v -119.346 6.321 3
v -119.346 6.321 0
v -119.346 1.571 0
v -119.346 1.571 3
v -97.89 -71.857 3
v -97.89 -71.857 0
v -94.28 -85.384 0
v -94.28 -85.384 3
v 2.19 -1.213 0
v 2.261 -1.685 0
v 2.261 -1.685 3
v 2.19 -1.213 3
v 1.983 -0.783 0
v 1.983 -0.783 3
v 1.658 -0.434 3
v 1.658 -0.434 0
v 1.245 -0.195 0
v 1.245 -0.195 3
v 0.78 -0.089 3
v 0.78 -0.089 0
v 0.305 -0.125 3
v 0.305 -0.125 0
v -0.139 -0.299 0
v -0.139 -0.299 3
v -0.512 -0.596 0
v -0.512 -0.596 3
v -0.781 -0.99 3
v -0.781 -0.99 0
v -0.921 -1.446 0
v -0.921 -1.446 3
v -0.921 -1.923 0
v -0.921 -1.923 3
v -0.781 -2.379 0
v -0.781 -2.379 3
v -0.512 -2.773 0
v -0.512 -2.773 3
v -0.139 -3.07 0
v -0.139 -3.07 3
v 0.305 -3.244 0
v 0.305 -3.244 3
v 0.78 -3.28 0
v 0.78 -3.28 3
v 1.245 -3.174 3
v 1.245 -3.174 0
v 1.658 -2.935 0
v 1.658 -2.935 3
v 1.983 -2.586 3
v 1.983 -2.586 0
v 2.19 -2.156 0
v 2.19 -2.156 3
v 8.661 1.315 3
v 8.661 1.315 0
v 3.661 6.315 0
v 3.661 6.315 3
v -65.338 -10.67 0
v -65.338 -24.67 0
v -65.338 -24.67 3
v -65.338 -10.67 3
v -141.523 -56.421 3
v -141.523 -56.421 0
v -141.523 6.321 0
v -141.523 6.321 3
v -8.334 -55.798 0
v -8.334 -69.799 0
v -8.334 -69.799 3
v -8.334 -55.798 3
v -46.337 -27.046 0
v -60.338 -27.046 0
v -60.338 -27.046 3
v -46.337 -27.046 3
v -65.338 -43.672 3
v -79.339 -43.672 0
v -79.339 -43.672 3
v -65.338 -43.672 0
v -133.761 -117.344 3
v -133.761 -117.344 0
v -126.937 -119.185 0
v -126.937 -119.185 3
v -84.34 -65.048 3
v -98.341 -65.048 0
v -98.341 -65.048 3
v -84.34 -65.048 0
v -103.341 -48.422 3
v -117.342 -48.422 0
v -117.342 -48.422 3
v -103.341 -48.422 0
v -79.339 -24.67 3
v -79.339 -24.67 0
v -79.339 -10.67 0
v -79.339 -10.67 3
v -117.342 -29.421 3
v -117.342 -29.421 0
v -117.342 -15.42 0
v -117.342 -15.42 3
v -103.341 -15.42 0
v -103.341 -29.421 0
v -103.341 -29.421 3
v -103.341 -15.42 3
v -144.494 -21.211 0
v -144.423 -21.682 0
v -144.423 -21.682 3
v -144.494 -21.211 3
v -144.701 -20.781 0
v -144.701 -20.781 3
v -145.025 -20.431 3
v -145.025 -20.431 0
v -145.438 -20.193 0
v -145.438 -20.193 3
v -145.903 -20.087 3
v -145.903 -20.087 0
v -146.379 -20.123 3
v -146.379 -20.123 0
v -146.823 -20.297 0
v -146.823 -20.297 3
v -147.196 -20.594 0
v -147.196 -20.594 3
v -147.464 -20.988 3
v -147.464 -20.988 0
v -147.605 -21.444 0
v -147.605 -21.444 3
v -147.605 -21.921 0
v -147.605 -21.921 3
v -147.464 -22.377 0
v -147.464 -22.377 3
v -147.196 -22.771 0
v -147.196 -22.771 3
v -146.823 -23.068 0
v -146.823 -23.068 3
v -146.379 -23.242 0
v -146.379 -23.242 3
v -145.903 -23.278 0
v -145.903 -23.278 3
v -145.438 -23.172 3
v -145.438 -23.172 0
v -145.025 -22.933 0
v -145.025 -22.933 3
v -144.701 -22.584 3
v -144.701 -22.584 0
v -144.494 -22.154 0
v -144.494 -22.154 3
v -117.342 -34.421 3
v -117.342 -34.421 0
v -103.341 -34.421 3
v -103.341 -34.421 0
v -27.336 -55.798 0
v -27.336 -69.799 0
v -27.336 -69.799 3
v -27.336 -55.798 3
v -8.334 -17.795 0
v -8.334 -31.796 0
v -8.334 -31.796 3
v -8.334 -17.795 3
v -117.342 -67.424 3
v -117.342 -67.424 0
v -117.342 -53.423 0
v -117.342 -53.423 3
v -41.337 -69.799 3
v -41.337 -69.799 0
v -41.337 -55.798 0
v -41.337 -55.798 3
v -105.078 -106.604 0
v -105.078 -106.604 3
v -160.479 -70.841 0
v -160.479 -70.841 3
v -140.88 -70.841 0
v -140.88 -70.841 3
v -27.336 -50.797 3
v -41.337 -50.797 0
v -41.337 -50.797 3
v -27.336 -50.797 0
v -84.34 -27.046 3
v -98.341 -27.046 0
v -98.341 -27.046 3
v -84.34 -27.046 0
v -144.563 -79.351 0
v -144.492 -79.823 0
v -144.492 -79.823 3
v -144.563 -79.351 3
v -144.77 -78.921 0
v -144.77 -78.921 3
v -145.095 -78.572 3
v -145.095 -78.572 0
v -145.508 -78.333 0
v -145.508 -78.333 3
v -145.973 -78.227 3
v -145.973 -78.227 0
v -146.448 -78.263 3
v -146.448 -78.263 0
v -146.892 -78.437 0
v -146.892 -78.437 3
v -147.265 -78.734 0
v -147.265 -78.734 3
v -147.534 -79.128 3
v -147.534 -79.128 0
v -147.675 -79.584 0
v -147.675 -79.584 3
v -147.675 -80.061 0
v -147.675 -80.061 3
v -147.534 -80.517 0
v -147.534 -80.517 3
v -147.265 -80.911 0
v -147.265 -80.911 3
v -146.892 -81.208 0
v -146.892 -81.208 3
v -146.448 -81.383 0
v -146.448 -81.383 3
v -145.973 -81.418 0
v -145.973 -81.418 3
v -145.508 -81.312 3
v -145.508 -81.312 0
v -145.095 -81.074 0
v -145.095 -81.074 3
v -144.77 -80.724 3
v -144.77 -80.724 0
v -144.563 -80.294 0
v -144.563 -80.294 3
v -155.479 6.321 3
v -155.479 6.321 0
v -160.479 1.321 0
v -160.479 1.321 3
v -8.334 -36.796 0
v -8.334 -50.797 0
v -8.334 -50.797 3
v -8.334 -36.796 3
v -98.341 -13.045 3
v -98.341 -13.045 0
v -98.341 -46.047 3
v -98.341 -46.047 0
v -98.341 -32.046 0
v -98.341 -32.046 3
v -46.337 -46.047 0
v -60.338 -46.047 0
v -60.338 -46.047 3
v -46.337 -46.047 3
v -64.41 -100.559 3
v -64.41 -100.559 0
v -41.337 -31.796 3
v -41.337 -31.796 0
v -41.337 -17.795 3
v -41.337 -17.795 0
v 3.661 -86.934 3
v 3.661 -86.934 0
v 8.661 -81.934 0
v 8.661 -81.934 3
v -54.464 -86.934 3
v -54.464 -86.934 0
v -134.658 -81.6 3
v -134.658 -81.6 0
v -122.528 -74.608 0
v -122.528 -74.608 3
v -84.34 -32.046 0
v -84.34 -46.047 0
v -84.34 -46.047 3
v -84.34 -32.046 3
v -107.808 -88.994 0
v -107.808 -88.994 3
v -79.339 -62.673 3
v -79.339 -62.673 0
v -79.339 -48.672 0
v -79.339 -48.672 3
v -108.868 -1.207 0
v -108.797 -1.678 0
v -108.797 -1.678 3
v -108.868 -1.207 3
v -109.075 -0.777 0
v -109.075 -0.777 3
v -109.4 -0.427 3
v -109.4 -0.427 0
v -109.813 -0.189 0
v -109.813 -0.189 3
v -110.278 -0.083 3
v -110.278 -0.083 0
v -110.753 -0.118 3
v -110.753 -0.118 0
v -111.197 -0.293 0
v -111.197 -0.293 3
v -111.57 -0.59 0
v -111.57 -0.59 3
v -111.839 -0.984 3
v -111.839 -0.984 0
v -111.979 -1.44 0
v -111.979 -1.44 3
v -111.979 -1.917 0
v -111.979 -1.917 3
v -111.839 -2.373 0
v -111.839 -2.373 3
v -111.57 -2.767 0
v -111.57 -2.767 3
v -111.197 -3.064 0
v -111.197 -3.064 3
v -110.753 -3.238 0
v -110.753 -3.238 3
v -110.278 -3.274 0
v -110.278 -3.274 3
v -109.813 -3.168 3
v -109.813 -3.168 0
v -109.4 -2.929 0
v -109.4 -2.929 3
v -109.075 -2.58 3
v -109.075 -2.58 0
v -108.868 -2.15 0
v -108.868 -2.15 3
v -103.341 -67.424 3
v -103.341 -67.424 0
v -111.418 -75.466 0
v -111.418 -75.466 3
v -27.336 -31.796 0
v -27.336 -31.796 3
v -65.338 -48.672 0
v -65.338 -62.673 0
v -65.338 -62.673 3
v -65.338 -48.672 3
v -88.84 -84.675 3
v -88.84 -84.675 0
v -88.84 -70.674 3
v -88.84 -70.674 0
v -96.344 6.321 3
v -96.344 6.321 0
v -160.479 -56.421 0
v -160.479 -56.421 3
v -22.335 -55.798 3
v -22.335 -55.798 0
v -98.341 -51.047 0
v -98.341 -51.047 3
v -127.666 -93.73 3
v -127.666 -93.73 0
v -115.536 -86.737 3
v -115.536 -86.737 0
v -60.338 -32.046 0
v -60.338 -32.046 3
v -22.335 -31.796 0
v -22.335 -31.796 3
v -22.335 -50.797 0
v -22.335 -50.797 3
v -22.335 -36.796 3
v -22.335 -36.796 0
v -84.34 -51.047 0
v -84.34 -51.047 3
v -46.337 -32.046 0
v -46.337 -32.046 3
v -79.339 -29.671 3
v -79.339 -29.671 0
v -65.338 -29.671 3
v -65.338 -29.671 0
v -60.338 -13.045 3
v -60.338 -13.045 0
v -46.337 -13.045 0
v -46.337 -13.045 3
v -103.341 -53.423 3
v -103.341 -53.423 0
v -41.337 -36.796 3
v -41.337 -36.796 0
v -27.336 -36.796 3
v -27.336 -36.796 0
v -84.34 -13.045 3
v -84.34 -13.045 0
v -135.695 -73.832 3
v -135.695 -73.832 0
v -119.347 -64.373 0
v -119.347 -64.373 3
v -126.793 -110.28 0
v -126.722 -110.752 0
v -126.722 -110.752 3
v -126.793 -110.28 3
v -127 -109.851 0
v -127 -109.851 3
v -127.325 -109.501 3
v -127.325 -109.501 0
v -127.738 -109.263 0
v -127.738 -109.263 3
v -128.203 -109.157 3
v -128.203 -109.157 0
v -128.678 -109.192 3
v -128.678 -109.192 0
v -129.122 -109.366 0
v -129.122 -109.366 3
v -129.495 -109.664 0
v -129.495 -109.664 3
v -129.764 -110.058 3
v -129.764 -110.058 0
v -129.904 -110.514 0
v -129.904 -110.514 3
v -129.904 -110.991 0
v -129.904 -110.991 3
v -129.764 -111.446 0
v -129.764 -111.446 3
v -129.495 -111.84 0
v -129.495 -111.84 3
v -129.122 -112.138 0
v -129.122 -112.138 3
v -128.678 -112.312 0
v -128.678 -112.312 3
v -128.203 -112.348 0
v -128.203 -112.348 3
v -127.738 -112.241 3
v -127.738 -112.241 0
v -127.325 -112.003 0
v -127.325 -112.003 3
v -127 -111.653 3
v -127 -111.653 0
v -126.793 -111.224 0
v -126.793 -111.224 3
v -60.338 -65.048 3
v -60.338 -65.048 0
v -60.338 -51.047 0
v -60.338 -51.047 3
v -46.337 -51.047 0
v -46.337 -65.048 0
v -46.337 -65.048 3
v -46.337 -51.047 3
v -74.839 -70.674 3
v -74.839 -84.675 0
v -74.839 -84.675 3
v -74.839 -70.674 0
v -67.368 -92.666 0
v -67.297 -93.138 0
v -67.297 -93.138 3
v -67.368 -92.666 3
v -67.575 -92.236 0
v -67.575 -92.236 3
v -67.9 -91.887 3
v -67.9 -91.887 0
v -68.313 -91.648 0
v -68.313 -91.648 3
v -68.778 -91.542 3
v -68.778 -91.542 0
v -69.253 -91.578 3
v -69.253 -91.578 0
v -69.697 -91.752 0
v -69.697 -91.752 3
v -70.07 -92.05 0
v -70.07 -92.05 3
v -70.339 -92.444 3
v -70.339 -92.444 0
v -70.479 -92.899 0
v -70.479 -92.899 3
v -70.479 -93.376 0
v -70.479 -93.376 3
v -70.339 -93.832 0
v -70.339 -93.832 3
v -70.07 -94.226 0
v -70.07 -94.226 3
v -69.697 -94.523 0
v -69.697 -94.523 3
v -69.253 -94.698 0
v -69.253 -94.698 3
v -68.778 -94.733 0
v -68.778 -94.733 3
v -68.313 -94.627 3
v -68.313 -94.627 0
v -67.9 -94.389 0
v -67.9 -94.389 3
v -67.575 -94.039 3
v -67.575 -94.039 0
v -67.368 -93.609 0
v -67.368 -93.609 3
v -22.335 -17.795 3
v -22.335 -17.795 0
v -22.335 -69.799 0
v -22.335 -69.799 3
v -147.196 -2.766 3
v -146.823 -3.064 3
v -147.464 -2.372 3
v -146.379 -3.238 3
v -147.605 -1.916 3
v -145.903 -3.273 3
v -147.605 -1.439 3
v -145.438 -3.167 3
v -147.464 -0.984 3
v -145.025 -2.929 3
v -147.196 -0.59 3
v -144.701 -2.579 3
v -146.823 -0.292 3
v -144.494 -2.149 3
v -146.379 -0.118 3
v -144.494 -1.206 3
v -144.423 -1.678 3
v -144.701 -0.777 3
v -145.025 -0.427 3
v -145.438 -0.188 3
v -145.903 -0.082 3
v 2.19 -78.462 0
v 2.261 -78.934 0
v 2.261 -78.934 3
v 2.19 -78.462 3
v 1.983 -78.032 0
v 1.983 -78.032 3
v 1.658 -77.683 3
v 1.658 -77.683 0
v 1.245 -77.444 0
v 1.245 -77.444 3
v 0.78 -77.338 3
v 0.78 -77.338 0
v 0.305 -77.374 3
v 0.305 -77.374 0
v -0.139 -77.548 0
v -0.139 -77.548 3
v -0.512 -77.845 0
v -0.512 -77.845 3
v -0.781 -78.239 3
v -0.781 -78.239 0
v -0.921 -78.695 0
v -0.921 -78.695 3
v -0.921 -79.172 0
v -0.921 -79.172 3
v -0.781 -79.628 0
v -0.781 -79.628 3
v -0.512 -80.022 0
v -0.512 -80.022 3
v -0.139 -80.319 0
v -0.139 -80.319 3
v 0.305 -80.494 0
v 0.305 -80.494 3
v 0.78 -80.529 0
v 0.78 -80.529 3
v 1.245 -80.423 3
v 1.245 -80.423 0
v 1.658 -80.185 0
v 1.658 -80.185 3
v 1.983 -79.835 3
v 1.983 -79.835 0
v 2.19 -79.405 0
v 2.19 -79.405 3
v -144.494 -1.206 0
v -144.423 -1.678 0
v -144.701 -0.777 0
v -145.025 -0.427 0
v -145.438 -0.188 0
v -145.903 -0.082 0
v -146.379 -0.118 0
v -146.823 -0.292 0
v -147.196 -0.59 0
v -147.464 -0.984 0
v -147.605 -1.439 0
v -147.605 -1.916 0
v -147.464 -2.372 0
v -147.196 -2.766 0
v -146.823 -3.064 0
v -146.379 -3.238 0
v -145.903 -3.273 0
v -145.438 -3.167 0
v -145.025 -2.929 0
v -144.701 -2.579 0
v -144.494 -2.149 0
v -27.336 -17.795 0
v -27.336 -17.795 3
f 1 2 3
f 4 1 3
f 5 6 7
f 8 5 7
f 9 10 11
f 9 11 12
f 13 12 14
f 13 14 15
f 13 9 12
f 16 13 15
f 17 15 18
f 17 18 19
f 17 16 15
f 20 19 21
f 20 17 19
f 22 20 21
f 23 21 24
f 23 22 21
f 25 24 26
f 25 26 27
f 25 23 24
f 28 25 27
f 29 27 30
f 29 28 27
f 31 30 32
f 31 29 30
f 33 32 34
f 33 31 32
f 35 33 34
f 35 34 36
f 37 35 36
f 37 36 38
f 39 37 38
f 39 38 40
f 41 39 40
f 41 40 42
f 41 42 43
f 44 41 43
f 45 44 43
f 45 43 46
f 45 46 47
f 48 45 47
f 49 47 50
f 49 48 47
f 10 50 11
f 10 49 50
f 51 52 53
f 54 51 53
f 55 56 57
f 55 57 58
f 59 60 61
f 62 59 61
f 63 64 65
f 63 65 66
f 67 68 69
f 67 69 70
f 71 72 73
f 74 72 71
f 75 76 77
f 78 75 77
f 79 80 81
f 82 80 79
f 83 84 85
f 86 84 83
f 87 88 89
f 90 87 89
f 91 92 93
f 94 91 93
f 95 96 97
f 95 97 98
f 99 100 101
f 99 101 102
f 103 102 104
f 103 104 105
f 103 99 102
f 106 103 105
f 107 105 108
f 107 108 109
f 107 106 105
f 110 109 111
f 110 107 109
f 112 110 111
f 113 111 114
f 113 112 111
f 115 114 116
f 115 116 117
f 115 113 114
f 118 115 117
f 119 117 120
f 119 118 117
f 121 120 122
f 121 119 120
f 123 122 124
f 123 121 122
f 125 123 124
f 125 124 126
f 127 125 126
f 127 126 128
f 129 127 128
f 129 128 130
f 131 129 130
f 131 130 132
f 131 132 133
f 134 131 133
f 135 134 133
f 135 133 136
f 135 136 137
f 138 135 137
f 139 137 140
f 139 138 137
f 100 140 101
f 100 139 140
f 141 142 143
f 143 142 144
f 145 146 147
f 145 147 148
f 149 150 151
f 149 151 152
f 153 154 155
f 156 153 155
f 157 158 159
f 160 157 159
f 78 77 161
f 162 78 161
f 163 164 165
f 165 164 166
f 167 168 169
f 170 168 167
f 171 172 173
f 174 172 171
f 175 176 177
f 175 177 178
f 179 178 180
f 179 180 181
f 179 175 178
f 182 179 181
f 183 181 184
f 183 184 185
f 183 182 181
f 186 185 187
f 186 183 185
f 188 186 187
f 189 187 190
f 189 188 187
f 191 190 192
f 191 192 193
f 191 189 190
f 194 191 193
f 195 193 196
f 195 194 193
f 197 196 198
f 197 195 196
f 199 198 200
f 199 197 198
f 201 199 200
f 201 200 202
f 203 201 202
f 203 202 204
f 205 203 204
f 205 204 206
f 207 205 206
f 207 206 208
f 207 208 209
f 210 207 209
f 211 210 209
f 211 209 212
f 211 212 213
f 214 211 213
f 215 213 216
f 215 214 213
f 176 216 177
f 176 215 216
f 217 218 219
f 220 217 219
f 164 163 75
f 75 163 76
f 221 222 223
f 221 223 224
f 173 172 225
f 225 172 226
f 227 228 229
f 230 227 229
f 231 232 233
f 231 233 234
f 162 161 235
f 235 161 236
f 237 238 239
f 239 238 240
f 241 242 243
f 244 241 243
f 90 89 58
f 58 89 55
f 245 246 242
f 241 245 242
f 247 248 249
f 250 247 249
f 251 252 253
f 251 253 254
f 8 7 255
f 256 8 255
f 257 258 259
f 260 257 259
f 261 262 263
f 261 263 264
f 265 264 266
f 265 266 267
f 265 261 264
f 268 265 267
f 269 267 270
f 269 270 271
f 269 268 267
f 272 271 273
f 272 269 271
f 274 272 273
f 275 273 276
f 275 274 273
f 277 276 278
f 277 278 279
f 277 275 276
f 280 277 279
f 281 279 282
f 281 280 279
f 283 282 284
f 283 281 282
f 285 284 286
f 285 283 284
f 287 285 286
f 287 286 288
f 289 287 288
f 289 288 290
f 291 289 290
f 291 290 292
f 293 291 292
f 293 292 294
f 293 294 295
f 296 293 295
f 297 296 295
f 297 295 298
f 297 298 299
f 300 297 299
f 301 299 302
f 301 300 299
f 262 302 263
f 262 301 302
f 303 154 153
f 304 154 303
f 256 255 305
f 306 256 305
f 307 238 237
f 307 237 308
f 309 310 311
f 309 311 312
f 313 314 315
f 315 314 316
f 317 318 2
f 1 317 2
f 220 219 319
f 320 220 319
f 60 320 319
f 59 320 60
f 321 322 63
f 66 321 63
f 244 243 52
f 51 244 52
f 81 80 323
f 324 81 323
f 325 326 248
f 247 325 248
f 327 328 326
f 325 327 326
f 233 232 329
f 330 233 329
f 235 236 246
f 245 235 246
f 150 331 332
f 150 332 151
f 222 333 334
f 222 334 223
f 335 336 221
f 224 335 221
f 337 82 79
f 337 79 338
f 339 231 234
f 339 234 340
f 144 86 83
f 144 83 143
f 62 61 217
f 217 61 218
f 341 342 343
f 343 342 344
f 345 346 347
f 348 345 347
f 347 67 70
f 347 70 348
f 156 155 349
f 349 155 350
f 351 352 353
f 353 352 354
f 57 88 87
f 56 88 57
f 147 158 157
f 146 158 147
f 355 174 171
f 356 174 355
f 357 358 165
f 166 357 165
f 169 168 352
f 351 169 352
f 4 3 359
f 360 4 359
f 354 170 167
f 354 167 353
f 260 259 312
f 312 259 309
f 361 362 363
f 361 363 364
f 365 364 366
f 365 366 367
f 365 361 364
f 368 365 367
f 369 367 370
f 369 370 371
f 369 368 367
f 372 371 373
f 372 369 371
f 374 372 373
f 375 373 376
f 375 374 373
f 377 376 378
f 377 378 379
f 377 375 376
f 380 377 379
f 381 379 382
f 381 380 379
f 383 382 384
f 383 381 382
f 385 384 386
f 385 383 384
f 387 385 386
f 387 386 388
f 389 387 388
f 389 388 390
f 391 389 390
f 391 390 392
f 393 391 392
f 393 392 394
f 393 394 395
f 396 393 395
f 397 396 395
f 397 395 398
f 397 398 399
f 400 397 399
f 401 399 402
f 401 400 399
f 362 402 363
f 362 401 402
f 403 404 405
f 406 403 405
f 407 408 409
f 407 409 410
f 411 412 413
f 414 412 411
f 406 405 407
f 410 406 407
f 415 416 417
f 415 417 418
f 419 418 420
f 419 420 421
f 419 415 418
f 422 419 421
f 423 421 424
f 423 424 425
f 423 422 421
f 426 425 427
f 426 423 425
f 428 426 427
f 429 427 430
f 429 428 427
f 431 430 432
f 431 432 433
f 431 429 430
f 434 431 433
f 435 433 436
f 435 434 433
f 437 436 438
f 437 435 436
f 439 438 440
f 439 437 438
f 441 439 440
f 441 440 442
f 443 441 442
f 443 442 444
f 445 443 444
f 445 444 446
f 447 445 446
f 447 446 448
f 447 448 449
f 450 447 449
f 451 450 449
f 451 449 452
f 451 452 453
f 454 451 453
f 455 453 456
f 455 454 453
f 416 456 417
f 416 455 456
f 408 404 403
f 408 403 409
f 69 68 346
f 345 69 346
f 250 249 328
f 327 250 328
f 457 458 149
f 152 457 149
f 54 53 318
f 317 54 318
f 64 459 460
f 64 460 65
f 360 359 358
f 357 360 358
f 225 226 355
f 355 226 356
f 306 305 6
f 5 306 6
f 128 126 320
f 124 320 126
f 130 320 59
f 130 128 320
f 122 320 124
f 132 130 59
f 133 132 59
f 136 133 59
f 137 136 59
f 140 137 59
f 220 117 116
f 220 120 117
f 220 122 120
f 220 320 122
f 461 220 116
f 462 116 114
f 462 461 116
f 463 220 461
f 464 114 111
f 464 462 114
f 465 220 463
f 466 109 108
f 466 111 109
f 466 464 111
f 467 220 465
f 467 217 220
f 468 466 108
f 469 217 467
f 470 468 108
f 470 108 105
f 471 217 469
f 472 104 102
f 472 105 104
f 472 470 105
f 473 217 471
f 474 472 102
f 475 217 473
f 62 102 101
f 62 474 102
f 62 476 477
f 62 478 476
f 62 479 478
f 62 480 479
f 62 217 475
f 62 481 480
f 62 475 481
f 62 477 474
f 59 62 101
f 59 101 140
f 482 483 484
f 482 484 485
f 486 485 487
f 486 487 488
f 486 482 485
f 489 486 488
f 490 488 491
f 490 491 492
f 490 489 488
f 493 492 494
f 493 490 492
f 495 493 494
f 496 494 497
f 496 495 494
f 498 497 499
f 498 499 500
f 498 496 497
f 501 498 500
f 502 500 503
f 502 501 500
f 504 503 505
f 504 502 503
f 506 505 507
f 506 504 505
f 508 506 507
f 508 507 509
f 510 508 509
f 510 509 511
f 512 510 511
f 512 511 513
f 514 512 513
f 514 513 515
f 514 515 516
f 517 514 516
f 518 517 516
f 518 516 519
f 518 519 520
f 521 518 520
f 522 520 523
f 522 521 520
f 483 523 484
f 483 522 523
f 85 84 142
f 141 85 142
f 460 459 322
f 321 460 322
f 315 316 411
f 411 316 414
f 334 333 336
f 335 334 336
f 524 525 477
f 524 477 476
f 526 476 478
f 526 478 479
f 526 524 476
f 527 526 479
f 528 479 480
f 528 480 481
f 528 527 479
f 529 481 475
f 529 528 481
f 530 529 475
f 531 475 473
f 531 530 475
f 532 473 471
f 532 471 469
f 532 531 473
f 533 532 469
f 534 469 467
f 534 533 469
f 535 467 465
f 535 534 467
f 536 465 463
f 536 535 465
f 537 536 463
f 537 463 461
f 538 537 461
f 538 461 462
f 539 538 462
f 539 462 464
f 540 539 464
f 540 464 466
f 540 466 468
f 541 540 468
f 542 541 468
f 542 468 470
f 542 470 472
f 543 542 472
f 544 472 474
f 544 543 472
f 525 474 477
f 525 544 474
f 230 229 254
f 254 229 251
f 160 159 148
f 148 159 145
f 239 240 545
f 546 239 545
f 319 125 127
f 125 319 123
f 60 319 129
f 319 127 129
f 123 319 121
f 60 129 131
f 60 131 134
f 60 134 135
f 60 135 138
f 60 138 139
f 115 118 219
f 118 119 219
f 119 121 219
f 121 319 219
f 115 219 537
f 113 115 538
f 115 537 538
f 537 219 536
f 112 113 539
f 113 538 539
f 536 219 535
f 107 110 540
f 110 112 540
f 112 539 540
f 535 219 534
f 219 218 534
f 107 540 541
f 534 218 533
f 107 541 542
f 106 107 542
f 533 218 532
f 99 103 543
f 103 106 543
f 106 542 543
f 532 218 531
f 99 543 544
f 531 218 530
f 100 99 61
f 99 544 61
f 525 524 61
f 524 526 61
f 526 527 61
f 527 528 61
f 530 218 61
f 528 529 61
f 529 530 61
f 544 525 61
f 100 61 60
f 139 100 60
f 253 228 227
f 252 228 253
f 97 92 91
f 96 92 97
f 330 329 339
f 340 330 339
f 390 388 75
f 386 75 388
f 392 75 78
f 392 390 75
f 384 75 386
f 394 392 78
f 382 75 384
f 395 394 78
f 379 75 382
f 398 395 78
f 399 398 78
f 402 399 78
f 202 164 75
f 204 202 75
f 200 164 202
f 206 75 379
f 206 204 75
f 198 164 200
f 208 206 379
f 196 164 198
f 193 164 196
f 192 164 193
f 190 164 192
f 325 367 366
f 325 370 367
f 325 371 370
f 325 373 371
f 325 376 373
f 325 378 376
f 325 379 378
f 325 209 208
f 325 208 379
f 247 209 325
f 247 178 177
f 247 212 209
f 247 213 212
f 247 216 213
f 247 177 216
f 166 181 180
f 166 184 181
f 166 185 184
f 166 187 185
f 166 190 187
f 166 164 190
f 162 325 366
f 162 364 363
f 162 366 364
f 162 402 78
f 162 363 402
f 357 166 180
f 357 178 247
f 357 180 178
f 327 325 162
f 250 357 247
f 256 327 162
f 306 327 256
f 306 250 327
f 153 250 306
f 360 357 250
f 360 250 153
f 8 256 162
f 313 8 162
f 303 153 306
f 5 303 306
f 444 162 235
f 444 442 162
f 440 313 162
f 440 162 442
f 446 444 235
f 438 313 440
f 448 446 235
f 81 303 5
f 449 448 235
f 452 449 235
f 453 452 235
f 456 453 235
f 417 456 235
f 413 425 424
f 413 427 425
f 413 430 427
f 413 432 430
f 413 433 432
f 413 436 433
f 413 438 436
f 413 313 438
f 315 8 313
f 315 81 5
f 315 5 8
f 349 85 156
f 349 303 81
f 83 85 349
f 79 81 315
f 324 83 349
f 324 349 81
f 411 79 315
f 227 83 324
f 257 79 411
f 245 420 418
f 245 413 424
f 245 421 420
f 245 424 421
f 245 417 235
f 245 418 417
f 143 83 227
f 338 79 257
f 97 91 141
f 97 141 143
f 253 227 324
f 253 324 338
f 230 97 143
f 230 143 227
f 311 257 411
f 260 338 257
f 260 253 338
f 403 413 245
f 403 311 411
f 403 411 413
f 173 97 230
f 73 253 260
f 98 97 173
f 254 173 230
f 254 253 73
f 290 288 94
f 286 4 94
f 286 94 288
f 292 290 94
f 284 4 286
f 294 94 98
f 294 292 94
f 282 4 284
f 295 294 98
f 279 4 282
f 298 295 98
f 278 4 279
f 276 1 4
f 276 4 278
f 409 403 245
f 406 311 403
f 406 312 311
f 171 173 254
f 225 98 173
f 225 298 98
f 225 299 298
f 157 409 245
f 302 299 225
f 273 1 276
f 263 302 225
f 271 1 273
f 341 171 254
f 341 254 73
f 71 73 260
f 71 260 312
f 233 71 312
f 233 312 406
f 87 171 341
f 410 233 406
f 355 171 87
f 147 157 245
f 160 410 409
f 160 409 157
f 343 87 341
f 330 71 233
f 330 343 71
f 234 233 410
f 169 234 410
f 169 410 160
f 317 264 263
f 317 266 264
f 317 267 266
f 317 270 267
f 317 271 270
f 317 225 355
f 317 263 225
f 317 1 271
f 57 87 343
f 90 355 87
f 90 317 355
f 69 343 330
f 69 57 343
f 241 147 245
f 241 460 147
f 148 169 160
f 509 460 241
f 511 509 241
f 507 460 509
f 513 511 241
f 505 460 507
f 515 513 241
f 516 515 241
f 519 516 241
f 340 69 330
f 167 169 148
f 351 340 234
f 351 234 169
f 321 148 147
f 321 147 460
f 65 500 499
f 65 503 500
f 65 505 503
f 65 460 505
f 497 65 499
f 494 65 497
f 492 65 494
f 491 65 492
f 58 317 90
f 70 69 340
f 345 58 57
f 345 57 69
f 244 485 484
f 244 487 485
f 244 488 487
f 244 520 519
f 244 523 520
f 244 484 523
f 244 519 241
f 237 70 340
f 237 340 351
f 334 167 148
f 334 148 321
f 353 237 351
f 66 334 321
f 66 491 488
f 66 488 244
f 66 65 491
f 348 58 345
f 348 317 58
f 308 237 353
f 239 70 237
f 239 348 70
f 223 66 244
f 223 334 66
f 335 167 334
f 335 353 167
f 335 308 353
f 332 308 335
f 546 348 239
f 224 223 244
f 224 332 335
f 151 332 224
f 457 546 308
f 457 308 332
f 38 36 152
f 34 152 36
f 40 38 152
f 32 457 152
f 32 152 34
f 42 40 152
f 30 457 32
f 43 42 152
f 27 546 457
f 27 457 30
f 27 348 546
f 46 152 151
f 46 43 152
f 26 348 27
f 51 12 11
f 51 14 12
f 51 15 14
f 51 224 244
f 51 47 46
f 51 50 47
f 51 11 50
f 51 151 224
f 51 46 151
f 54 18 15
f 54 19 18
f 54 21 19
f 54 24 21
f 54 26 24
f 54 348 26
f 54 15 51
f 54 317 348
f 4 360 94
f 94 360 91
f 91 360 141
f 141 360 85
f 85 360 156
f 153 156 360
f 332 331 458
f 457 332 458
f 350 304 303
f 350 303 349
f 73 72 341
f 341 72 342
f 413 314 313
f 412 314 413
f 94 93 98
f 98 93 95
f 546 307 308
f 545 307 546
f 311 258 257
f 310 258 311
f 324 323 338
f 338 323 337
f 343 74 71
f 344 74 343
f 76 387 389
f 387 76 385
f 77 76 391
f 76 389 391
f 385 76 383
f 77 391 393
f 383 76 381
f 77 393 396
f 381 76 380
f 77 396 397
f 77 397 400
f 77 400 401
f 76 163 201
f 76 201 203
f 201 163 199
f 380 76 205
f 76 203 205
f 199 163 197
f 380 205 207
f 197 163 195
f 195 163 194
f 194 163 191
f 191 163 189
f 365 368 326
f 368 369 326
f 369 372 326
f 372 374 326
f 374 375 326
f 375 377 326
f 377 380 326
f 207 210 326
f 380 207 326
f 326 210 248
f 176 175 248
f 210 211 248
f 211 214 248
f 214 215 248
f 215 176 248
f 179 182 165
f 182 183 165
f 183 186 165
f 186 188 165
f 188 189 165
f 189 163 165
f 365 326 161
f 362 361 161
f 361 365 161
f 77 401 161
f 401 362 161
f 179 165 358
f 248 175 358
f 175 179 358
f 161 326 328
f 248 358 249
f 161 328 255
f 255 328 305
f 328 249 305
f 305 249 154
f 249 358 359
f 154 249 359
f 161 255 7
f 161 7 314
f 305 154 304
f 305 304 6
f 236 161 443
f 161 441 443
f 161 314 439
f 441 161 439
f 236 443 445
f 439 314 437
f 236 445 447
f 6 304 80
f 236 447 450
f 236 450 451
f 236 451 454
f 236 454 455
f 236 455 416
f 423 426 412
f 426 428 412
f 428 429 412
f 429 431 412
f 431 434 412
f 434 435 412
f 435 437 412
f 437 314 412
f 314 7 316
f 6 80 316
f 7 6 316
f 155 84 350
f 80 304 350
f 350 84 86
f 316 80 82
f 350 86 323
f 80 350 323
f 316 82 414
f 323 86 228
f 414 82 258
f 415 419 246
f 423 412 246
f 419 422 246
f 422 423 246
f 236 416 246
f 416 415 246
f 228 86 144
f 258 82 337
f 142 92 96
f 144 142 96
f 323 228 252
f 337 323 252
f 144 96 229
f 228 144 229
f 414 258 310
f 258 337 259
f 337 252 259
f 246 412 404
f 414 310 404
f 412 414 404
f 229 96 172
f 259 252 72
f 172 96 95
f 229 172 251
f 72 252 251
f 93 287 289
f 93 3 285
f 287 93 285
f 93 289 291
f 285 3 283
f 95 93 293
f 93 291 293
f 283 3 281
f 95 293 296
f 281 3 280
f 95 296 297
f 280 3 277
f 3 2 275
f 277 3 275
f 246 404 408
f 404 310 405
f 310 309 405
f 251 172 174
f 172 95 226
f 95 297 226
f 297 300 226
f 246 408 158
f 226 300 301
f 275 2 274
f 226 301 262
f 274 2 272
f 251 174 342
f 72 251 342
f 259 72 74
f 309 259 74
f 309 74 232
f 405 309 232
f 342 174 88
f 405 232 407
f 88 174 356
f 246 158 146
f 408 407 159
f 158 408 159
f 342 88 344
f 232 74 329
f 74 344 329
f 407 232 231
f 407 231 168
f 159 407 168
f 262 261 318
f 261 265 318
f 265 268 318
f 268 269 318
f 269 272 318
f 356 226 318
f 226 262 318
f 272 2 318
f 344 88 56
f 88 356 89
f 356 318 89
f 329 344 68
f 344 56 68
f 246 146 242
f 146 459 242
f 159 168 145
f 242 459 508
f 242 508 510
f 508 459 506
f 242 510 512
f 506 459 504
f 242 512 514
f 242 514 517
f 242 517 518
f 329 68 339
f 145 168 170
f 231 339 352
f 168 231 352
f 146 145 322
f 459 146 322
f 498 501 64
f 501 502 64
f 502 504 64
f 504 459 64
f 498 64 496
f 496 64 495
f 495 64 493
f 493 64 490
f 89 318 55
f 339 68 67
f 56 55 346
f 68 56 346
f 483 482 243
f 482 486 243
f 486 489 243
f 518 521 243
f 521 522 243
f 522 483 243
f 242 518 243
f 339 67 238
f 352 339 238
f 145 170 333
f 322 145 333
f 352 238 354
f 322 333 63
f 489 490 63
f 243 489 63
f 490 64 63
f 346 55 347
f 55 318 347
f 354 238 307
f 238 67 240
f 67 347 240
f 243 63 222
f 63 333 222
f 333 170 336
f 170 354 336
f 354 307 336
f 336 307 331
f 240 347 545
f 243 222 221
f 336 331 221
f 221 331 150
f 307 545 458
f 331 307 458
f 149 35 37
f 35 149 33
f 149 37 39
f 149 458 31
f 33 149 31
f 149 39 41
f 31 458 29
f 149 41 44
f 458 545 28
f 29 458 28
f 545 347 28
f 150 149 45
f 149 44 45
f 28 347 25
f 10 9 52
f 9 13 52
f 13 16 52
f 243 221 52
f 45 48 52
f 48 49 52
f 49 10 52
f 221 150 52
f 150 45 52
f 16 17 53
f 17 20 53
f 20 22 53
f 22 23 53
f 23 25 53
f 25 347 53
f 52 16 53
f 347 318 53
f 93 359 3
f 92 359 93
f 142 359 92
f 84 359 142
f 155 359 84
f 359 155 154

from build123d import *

# Parameters (mm, degrees)
SWITCHPLATE_R           = 1.6
SWITCHPLATE_W           = 14.000982373
SWITCHPLATE_H           = 14.000982374
SWITCHPLATE_H_2         = 14.000982373
SWITCHPLATE_W_2         = 14.000982374
BOSS_EXTRU_2_DEPTH      = 3
ESQUISSE1_W             = 20.456160795
ESQUISSE1_H             = 14.420470361
ENL_V_MAT_EXTRU_1_DEPTH = 10


with BuildPart() as part:
    # Switchplate → Boss.-Extru.2 (new body)
    with BuildSketch(Plane.XY):
        Polygon((-160.478985875, -70.841138967), (-133.761270027, -117.344044002), (-126.936961278, -119.18521524), (-105.07834936, -106.603969177), (-64.409664562, -100.558603138), (-54.463628843, -86.933633781), (3.660893039, -86.933633781), (8.660893039, -81.933633781), (8.660893039, 1.315012353), (3.660893047, 6.315290442), (-96.344426674, 6.320852512), (-103.340940531, 6.320852512), (-119.346315028, 6.320852512), (-119.346315028, 1.570515597), (-119.346630506, -64.372807463), (-135.694988334, -73.831500172), (-141.52282508, -70.47035259), (-141.52282508, 1.570515597), (-141.52282508, 6.320852512), (-155.478985875, 6.320852512), (-160.478985875, 1.320852512), (-160.478985875, -3.429484403), align=None)
        with Locations((0.660893039, -1.684542717)):
            Circle(SWITCHPLATE_R, mode=Mode.SUBTRACT)
        with Locations((-110.397084988, -1.678365923)):
            Circle(SWITCHPLATE_R, mode=Mode.SUBTRACT)
        with Locations((0.660893039, -78.933633781)):
            Circle(SWITCHPLATE_R, mode=Mode.SUBTRACT)
        with Locations((-68.897334865, -93.137788223)):
            Circle(SWITCHPLATE_R, mode=Mode.SUBTRACT)
        with Locations((-128.322250168, -110.752044388)):
            Circle(SWITCHPLATE_R, mode=Mode.SUBTRACT)
        with Locations((-146.0923789, -79.822656053)):
            Circle(SWITCHPLATE_R, mode=Mode.SUBTRACT)
        with Locations((-146.02282508, -1.677868186)):
            Circle(SWITCHPLATE_R, mode=Mode.SUBTRACT)
        with Locations((-146.02282508, -21.682390047)):
            Circle(SWITCHPLATE_R, mode=Mode.SUBTRACT)
        with Locations((-110.341431718, -22.42033468)):
            Rectangle(SWITCHPLATE_W, SWITCHPLATE_H, mode=Mode.SUBTRACT)
        with Locations((-91.340084057, -20.045166224)):
            Rectangle(SWITCHPLATE_W, SWITCHPLATE_H_2, mode=Mode.SUBTRACT)
        with Locations((-72.338736396, -17.669997767)):
            Rectangle(SWITCHPLATE_W_2, SWITCHPLATE_H, mode=Mode.SUBTRACT)
        with Locations((-53.337388735, -20.045166225)):
            Rectangle(SWITCHPLATE_W_2, SWITCHPLATE_H, mode=Mode.SUBTRACT)
        with Locations((-34.336041075, -24.795503141)):
            Rectangle(SWITCHPLATE_W_2, SWITCHPLATE_H, mode=Mode.SUBTRACT)
        with Locations((-15.334185378, -24.795503142)):
            Rectangle(SWITCHPLATE_W_2, SWITCHPLATE_H, mode=Mode.SUBTRACT)
        with Locations((-110.341431718, -41.421682341)):
            Rectangle(SWITCHPLATE_W_2, SWITCHPLATE_H, mode=Mode.SUBTRACT)
        with Locations((-91.340084058, -39.046513884)):
            Rectangle(SWITCHPLATE_W, SWITCHPLATE_H, mode=Mode.SUBTRACT)
        with Locations((-72.338736397, -36.671345428)):
            Rectangle(SWITCHPLATE_W_2, SWITCHPLATE_H_2, mode=Mode.SUBTRACT)
        with Locations((-53.337388736, -39.046513886)):
            Rectangle(SWITCHPLATE_W_2, SWITCHPLATE_H, mode=Mode.SUBTRACT)
        with Locations((-34.336041076, -43.796850802)):
            Rectangle(SWITCHPLATE_W, SWITCHPLATE_H, mode=Mode.SUBTRACT)
        with Locations((-15.334185379, -43.796850803)):
            Rectangle(SWITCHPLATE_W_2, SWITCHPLATE_H, mode=Mode.SUBTRACT)
        with Locations((-15.33418538, -62.798198464)):
            Rectangle(SWITCHPLATE_W_2, SWITCHPLATE_H_2, mode=Mode.SUBTRACT)
        with Locations((-34.336041077, -62.798198463)):
            Rectangle(SWITCHPLATE_W, SWITCHPLATE_H, mode=Mode.SUBTRACT)
        with Locations((-53.337388737, -58.047861547)):
            Rectangle(SWITCHPLATE_W_2, SWITCHPLATE_H, mode=Mode.SUBTRACT)
        with Locations((-72.338736397, -55.672693088)):
            Rectangle(SWITCHPLATE_W, SWITCHPLATE_H, mode=Mode.SUBTRACT)
        with Locations((-91.340084058, -58.047861545)):
            Rectangle(SWITCHPLATE_W_2, SWITCHPLATE_H, mode=Mode.SUBTRACT)
        with Locations((-110.341431719, -60.423030002)):
            Rectangle(SWITCHPLATE_W_2, SWITCHPLATE_H, mode=Mode.SUBTRACT)
        with Locations((-81.839410229, -77.674253537)):
            Rectangle(SWITCHPLATE_W_2, SWITCHPLATE_H, mode=Mode.SUBTRACT)
        Polygon((-111.417520933, -75.466480675), (-97.889935794, -71.856501764), (-94.279956882, -85.384086902), (-107.807542021, -88.994065814), align=None, mode=Mode.SUBTRACT)
        Polygon((-134.658112592, -81.599723585), (-122.528132256, -74.607507592), (-115.535916264, -86.737487928), (-127.665896599, -93.729703921), align=None, mode=Mode.SUBTRACT)
    extrude(amount=BOSS_EXTRU_2_DEPTH)

    # Esquisse1 → Enlèv. mat.-Extru.1 (cut)
    with BuildSketch(Plane.XY.offset(3)):
        with Locations((-150.250905477, -63.630903787)):
            Rectangle(ESQUISSE1_W, ESQUISSE1_H)
    extrude(amount=-ENL_V_MAT_EXTRU_1_DEPTH, mode=Mode.SUBTRACT)


with BuildPart() as enl_v_mat_extru_1_piece_1:
    # of the separate pieces the step leaves, piece 1, a body of its own (enl_v_mat_extru_1_pieces)
    add(part.part.solids().sort_by_distance((-160.478985875, -70.841138967, 0))[0])


with BuildPart() as enl_v_mat_extru_1_piece_2:
    # of the separate pieces the step leaves, piece 2, a body of its own (enl_v_mat_extru_1_pieces)
    add(part.part.solids().sort_by_distance((-160.478985875, 1.320852512, 0))[0])


solid = Compound([enl_v_mat_extru_1_piece_1.part, enl_v_mat_extru_1_piece_2.part])
